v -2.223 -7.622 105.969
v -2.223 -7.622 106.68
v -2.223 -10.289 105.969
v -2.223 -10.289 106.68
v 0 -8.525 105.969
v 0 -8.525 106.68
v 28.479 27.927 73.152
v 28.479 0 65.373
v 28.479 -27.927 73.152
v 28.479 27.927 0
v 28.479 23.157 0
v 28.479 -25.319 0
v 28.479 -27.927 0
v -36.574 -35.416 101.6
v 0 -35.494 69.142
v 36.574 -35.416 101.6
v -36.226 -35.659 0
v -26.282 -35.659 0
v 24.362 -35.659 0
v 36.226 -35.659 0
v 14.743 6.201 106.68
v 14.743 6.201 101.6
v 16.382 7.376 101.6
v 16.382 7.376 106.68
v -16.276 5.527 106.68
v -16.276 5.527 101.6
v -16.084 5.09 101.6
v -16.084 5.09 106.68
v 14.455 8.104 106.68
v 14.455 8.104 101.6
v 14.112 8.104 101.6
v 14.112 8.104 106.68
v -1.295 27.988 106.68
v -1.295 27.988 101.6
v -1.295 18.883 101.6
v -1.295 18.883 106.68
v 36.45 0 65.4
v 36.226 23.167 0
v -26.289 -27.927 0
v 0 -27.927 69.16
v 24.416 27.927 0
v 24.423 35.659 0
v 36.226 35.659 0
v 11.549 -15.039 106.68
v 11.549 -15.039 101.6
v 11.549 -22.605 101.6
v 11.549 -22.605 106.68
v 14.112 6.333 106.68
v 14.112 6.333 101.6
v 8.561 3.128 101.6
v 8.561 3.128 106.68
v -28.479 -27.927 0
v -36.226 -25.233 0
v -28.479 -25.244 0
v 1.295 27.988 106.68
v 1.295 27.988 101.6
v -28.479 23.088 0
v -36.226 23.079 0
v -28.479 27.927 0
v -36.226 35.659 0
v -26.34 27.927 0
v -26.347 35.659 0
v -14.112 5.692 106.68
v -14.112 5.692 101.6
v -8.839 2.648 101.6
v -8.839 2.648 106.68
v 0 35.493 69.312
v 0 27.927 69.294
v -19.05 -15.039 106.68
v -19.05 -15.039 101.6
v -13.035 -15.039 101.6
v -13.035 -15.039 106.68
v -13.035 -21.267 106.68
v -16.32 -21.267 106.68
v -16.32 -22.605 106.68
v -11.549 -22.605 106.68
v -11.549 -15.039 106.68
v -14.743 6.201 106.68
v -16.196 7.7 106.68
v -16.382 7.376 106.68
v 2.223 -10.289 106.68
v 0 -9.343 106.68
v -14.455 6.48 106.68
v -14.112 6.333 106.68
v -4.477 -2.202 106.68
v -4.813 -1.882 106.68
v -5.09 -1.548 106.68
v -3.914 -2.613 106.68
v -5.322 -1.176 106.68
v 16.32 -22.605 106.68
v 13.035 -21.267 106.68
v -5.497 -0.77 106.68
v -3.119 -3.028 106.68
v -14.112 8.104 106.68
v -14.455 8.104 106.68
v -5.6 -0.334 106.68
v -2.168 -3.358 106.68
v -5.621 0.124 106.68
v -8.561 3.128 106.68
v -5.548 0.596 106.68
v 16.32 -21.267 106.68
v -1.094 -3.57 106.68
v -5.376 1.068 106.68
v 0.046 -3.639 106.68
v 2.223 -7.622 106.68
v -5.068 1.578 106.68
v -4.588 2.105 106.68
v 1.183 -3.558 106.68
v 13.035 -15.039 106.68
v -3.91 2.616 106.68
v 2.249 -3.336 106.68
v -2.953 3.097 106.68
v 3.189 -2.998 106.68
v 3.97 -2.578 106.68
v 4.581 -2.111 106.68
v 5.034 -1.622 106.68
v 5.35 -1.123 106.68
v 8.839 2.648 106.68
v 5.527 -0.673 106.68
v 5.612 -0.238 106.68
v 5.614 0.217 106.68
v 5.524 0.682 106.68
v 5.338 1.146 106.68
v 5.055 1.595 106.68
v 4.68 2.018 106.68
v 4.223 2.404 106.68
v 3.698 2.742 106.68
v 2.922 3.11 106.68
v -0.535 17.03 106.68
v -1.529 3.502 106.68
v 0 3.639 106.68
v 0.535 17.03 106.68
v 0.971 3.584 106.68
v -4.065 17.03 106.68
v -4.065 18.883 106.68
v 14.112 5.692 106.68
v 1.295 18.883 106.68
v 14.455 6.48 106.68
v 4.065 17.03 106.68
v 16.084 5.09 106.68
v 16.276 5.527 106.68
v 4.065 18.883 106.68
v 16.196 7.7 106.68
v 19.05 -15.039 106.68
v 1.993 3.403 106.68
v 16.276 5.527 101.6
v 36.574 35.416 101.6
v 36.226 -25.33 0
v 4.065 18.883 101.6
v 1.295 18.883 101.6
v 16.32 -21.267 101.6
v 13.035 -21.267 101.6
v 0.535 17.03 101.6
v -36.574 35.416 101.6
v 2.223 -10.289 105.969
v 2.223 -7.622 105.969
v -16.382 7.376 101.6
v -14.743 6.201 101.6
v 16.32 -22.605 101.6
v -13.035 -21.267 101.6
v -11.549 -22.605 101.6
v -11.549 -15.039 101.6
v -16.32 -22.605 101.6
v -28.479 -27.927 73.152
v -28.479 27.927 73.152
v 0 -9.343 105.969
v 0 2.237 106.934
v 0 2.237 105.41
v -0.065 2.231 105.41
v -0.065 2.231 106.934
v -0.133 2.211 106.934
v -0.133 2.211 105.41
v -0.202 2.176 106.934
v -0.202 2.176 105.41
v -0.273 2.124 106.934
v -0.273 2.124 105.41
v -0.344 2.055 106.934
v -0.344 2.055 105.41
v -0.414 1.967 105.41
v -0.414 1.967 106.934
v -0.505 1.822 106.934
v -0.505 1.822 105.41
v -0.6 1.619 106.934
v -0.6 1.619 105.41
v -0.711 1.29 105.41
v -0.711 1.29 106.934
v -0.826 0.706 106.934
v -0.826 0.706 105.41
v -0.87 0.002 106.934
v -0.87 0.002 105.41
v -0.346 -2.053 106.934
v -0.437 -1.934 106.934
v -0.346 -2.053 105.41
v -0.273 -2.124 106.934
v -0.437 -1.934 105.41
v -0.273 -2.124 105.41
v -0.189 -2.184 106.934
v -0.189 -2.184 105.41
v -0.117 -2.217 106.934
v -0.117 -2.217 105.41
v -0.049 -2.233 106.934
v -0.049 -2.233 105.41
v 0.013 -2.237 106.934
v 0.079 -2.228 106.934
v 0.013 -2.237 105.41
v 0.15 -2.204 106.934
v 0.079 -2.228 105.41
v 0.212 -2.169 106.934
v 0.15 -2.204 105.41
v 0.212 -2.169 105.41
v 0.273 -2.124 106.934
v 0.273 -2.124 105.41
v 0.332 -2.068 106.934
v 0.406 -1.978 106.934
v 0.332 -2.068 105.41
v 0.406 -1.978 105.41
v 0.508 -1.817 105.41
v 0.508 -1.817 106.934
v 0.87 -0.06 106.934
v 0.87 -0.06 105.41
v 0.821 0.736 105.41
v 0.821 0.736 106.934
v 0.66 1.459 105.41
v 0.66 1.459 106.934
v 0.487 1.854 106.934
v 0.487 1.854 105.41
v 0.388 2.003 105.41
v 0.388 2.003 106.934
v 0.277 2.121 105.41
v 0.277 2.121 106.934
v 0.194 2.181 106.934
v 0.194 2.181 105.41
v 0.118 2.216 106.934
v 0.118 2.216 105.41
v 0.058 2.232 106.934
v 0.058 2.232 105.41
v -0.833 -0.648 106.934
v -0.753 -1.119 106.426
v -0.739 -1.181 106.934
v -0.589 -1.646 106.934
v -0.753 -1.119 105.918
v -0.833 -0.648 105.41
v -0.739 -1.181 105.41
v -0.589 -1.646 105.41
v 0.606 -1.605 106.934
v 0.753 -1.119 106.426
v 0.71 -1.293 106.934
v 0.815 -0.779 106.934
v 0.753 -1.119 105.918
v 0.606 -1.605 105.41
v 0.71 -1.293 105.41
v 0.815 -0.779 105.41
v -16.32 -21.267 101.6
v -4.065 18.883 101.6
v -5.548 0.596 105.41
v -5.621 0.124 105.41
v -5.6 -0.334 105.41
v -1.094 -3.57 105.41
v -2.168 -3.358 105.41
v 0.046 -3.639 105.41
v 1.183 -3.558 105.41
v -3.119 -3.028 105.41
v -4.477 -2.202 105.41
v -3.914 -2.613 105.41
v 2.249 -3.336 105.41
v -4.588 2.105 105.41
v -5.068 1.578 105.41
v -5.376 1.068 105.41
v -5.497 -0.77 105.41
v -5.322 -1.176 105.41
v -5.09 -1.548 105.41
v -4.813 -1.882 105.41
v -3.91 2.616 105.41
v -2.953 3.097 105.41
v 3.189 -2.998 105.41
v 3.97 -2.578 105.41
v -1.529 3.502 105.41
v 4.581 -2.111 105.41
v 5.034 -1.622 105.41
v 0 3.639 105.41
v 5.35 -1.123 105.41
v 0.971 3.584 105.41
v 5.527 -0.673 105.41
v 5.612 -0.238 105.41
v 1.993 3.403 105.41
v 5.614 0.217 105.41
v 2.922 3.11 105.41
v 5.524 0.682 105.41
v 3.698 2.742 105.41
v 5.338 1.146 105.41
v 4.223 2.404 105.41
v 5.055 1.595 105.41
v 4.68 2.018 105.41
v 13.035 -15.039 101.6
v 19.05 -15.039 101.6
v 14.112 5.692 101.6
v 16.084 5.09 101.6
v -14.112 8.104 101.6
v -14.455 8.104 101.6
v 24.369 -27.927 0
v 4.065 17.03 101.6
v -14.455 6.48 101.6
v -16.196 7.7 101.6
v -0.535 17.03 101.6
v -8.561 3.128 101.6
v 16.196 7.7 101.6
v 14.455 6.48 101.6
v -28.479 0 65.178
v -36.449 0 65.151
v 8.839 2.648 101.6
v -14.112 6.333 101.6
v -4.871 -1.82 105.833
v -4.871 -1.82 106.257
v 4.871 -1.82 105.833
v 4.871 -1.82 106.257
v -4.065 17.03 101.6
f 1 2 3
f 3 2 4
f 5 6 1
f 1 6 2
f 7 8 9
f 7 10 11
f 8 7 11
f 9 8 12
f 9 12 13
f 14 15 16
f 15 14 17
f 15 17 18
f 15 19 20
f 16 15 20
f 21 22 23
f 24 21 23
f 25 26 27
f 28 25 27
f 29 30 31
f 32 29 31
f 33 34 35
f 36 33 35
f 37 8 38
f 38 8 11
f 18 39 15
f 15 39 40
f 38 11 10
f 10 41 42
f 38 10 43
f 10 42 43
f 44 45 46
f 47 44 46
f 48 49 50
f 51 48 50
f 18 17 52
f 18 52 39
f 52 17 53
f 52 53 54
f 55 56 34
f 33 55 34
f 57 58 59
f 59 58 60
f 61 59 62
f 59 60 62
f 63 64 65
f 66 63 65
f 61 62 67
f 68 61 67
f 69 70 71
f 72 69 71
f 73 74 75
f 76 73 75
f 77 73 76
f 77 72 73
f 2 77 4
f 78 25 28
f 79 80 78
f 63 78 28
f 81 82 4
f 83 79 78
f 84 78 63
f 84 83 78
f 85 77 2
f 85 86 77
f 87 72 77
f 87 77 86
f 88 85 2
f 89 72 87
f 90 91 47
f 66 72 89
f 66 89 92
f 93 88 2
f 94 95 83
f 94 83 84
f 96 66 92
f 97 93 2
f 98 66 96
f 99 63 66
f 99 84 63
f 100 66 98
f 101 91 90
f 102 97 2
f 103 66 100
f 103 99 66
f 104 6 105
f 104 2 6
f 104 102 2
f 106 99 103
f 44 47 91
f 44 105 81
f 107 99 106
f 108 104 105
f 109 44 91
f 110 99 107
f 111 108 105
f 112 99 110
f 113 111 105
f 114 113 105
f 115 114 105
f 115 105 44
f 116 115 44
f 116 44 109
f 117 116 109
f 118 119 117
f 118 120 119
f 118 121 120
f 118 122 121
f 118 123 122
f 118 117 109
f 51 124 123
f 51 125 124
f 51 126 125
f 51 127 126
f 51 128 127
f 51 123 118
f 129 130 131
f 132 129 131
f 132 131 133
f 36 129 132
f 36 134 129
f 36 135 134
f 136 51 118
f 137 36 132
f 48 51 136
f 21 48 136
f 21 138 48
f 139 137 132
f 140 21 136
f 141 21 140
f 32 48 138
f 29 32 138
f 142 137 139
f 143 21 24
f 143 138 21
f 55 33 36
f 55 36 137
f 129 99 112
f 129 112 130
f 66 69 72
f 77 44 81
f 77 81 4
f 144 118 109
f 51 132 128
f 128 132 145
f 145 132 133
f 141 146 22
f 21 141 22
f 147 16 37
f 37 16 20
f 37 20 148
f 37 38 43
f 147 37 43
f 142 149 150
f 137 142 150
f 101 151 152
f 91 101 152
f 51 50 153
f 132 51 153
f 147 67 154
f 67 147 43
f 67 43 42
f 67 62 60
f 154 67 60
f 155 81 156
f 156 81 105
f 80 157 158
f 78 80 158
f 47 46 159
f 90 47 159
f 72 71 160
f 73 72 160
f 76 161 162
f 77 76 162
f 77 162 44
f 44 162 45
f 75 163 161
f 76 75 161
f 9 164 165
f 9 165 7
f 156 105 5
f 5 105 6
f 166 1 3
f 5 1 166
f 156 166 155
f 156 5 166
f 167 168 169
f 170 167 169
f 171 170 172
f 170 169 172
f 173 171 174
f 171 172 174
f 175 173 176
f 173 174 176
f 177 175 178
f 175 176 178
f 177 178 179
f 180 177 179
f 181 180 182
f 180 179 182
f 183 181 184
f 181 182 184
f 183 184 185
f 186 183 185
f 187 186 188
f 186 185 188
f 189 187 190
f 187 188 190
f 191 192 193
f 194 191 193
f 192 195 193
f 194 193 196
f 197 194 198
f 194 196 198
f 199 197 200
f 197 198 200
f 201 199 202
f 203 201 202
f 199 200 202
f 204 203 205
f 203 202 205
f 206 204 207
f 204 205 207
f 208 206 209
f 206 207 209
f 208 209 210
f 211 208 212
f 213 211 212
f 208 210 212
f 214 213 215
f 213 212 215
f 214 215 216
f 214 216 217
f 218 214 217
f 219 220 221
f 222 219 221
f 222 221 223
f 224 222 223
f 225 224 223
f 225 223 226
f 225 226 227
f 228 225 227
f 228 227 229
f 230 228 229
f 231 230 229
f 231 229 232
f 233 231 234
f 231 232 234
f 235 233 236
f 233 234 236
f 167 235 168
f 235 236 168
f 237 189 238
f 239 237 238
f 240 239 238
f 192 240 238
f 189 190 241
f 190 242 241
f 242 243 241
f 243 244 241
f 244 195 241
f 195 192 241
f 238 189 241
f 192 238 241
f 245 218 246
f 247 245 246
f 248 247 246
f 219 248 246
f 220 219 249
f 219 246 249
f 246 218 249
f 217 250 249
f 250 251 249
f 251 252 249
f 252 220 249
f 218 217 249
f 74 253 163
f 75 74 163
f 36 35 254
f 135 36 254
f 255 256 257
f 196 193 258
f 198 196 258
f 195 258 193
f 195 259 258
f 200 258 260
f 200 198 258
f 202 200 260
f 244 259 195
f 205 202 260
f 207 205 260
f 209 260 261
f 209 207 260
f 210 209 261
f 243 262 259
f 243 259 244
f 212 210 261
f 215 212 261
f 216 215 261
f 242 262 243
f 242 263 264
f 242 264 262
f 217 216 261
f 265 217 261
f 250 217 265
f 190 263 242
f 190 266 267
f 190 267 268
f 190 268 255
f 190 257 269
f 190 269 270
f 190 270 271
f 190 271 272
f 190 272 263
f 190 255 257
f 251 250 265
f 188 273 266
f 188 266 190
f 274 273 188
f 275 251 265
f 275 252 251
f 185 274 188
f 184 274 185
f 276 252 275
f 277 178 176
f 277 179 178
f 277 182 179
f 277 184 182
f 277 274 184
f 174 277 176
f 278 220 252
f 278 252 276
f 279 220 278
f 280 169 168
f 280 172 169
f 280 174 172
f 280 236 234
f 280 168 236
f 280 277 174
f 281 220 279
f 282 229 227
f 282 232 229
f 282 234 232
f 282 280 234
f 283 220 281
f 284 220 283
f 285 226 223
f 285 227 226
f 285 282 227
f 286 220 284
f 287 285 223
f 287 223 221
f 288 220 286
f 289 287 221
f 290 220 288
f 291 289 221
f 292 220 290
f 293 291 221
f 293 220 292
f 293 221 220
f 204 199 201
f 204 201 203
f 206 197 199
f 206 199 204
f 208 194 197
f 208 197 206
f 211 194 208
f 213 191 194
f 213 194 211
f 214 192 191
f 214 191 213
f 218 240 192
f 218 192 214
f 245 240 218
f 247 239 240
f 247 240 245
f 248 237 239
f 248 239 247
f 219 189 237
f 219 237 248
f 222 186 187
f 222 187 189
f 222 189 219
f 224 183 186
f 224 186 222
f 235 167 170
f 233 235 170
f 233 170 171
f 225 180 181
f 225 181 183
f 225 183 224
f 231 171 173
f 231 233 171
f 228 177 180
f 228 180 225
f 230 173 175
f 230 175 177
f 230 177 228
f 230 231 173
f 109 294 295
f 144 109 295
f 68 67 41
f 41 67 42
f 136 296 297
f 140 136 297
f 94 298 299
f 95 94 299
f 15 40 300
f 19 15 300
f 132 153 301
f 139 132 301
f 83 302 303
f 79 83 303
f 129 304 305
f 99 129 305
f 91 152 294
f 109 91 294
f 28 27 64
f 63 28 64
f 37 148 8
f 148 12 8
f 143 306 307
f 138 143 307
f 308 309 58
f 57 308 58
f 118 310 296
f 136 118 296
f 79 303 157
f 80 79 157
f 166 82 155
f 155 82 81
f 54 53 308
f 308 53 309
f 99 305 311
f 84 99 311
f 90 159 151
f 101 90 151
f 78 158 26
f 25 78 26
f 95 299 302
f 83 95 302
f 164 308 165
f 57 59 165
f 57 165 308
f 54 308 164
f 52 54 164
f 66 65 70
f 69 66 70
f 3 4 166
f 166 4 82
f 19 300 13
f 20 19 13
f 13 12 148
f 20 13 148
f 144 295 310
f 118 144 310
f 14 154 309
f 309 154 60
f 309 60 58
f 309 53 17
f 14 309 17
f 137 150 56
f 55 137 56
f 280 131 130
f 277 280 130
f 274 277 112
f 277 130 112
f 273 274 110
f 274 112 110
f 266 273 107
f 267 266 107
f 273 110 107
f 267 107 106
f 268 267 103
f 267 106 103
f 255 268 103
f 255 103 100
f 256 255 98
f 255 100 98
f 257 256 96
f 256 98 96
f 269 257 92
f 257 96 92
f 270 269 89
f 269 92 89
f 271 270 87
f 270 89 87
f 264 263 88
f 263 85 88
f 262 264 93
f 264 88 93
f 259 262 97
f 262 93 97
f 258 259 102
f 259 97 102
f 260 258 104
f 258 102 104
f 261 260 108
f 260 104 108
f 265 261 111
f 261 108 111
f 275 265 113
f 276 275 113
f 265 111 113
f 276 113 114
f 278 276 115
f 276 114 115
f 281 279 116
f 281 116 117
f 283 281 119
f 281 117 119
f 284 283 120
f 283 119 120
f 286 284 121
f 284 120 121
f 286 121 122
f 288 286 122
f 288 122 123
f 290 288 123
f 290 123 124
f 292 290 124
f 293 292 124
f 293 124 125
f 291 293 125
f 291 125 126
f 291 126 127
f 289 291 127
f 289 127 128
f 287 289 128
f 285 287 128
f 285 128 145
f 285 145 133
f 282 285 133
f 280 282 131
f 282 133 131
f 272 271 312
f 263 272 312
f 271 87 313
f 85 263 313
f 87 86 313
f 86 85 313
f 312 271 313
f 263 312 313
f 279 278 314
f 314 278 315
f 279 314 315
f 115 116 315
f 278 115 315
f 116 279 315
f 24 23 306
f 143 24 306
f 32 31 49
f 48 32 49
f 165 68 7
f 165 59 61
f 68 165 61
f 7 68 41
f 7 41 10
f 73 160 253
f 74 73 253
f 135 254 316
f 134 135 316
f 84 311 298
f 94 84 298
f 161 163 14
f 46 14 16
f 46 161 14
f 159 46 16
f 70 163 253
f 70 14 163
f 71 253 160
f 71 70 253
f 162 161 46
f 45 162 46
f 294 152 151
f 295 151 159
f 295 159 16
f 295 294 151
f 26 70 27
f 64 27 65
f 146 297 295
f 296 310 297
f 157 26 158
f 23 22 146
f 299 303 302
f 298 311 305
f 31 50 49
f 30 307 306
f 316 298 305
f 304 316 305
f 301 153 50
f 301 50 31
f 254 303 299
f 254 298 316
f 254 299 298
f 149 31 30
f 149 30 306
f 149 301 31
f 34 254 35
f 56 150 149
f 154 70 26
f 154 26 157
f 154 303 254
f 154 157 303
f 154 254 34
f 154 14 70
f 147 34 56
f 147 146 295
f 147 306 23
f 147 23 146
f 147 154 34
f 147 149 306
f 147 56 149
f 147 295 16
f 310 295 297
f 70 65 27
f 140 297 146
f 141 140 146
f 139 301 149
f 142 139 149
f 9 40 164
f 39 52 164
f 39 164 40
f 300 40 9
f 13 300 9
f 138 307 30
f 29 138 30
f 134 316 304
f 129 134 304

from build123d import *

# Parameters (mm, degrees)
F2_W      = 73.1475353241
F2_H      = 70.8314999938
F0_W      = 72.4511295557
F0_H      = 71.3188424706
F5_W      = 56.9582432508
F5_H      = 55.8546073735
F6_DEPTH  = 73.152
F7_DEPTH  = 95.758
F9_DEPTH  = 86.614
F11_DEPTH = 5.08
F13_DEPTH = 1.27
F15_DEPTH = 1.524
F17_DEPTH = 0.7112


with BuildPart() as f3:
    # F2 (on offset) → F3 section 0
    with BuildSketch(Plane.XY.offset(101.6)):
        Rectangle(F2_W, F2_H)
    # F0 (on Top) → F3 section 1
    with BuildSketch(Plane.XY):
        Rectangle(F0_W, F0_H)
    loft()

    # F5 (on face) → F6 (cut)
    with BuildSketch(Plane(origin=(0, 0, 0), x_dir=(1, 0, 0), z_dir=(0, 0, -1))):
        Rectangle(F5_W, F5_H)
    extrude(amount=-F6_DEPTH, mode=Mode.SUBTRACT)

    # F4 (on face) → F7 (cut)
    with BuildSketch(Plane(origin=(-36.2251392898, 0, -0.1241505707), x_dir=(0, -1, 0), z_dir=(-0.9999941272, 0, -0.0034271736))):
        Polygon((0, 65.275169909), (-24.1607315838, -2.9297065921), (26.3105798513, -2.6568875182), align=None)
    extrude(amount=-F7_DEPTH, mode=Mode.SUBTRACT)

    # F8 (on face) → F9 (cut)
    with BuildSketch(Plane(origin=(0, 35.6592161225, 0.0855228873), x_dir=(-1, 0, 0), z_dir=(0, 0.999997124, 0.0023983321))):
        Polygon((0, 69.2265182734), (-25.3821723163, -2.8089256957), (27.3824948817, -2.8089256957), align=None)
    extrude(amount=-F9_DEPTH, mode=Mode.SUBTRACT)

    # F10 (on face) → F11 (join)
    with BuildSketch(Plane.XY.offset(101.6)):
        Polygon((-4.0646982379, 17.0300158512), (-0.5349854946, 17.0300158512), (-8.561149079, 3.1282927331), (-14.1121569056, 6.333168596), (-14.1121569056, 8.104111068), (-14.455312863, 8.104111068), (-14.455312863, 6.4796363004), (-16.1955226213, 7.6996413991), (-16.3821305686, 7.3764269532), (-14.7429471835, 6.2008514069), (-16.2762347609, 5.5274688639), (-16.0840704319, 5.0899119633), (-14.1121569056, 5.6922513065), (-8.8386744062, 2.6476047659), (-19.05, -15.0389299751), (-13.0346929654, -15.0389299751), (-11.5492390469, -15.0389299751), (11.5492390469, -15.0389299751), (13.0346929654, -15.0389299751), (19.05, -15.0389299751), (8.8386744062, 2.6476047659), (8.561149079, 3.1282927331), (0.5349854946, 17.0300158512), (4.0646982379, 17.0300158512), (4.0646982379, 18.883259967), (1.2949991506, 18.883259967), (1.2949991506, 27.9881376773), (-1.2949991506, 27.9881376773), (-1.2949991506, 18.883259967), (-4.0646982379, 18.883259967), align=None)
        Polygon((14.1121569056, 6.333168596), (8.561149079, 3.1282927331), (8.8386744062, 2.6476047659), (14.1121569056, 5.6922513065), (16.0840704319, 5.0899119633), (16.2762347609, 5.5274688639), (14.7429471835, 6.2008514069), (16.3821305686, 7.3764269532), (16.1955226213, 7.6996413991), (14.455312863, 6.4796363004), (14.455312863, 8.104111068), (14.1121569056, 8.104111068), align=None)
        Polygon((13.0346929654, -21.2668702006), (13.0346929654, -15.0389299751), (11.5492390469, -15.0389299751), (11.5492390469, -22.6051732898), (16.3196176291, -22.6051732898), (16.3196176291, -21.2668702006), align=None)
        Polygon((-11.5492390469, -15.0389299751), (-13.0346929654, -15.0389299751), (-13.0346929654, -21.2668702006), (-16.3196176291, -21.2668702006), (-16.3196176291, -22.6051732898), (-11.5492390469, -22.6051732898), align=None)
    extrude(amount=F11_DEPTH)

    # F12 (on face) → F13 (cut)
    with BuildSketch(Plane.XY.offset(106.68)):
        with BuildLine():
            add(Edge.make_bspline(
                [(0, 3.6390926689), (-9.7410636981, 3.6390926689), (-4.8705318491, -1.8195463344), (0, -7.2781853378), (4.8705318491, -1.8195463344), (9.7410636981, 3.6390926689), (0, 3.6390926689)],
                knots=[4.7123889804, 4.7123889804, 4.7123889804, 6.8067840828, 6.8067840828, 8.9011791852, 8.9011791852, 10.9955742876, 10.9955742876, 10.9955742876], degree=2, weights=[1, 0.5, 1, 0.5, 1, 0.5, 1]))
        make_face()
    extrude(amount=-F13_DEPTH, mode=Mode.SUBTRACT)

    # F14 (on face) → F15 (join)
    with BuildSketch(Plane.XY.offset(105.41)):
        with BuildLine():
            add(Edge.make_bspline(
                [(0, 2.2370060906), (-1.5068039382, 2.2370060906), (-0.7534019691, -1.1185030453), (0, -4.4740121812), (0.7534019691, -1.1185030453), (1.5068039382, 2.2370060906), (0, 2.2370060906)],
                knots=[0, 0, 0, 2.0943951024, 2.0943951024, 4.1887902048, 4.1887902048, 6.2831853072, 6.2831853072, 6.2831853072], degree=2, weights=[1, 0.5, 1, 0.5, 1, 0.5, 1]))
        make_face()
    extrude(amount=F15_DEPTH)

    # F16 (on face) → F17 (cut)
    with BuildSketch(Plane.XY.offset(106.68)):
        Polygon((2.2227161098, -7.6221204363), (0, -8.5254283622), (-2.2227161098, -7.6221204363), (-2.2227161098, -10.2890301496), (0, -9.3427076936), (2.2227161098, -10.2890301496), align=None)
    extrude(amount=-F17_DEPTH, mode=Mode.SUBTRACT)


solid = f3.part
